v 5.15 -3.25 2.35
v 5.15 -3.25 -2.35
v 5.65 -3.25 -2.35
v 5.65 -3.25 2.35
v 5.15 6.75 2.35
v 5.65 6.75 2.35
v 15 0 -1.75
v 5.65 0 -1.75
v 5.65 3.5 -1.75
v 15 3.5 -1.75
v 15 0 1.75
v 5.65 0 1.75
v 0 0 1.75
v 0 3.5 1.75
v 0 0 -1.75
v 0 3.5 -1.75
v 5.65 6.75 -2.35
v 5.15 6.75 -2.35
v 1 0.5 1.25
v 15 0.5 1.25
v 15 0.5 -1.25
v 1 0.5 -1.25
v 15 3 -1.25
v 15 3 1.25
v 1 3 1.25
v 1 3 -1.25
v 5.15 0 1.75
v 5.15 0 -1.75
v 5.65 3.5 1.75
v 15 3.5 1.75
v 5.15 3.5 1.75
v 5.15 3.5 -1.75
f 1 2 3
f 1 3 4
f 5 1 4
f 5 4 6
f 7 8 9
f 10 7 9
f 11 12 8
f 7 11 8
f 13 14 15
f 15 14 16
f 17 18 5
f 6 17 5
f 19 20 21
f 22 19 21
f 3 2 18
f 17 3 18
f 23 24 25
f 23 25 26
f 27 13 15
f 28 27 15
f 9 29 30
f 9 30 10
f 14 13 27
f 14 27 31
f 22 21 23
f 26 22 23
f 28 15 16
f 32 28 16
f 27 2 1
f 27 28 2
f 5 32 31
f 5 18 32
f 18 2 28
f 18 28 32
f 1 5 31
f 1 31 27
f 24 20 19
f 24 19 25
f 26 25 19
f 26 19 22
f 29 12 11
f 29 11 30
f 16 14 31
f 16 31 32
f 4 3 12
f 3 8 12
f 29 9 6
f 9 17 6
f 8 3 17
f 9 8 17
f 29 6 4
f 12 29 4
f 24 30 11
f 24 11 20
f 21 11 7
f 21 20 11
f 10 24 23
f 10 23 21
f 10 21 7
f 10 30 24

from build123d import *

# Parameters (mm, degrees)
CROQUIS1_W              = 3.5
CROQUIS1_H              = 3.5
SALIENTE_EXTRUIR1_DEPTH = 15
CROQUIS4_W              = 4.7
CROQUIS4_H              = 10
SALIENTE_EXTRUIR2_DEPTH = 0.5
CROQUIS5_W              = 2.5
CROQUIS5_H              = 2.5
CORTAR_EXTRUIR1_DEPTH   = 14


with BuildPart() as part:
    # Croquis1 → Saliente-Extruir1 (new body)
    with BuildSketch(Plane(origin=(0, 0, 0), x_dir=(0, 0, -1), z_dir=(1, 0, 0))):
        with Locations((0, 1.75)):
            Rectangle(CROQUIS1_W, CROQUIS1_H)
    extrude(amount=SALIENTE_EXTRUIR1_DEPTH)

    # Croquis4 → Saliente-Extruir2 (add)
    with BuildSketch(Plane.ZY.offset(-5.15)):
        with Locations((0, 1.75)):
            Rectangle(CROQUIS4_W, CROQUIS4_H)
    extrude(amount=-SALIENTE_EXTRUIR2_DEPTH)

    # Croquis5 → Cortar-Extruir1 (cut)
    with BuildSketch(Plane(origin=(15, 0, 0), x_dir=(0, 0, -1), z_dir=(1, 0, 0))):
        with Locations((0, 1.75)):
            Rectangle(CROQUIS5_W, CROQUIS5_H)
    extrude(amount=-CORTAR_EXTRUIR1_DEPTH, mode=Mode.SUBTRACT)


solid = part.part
